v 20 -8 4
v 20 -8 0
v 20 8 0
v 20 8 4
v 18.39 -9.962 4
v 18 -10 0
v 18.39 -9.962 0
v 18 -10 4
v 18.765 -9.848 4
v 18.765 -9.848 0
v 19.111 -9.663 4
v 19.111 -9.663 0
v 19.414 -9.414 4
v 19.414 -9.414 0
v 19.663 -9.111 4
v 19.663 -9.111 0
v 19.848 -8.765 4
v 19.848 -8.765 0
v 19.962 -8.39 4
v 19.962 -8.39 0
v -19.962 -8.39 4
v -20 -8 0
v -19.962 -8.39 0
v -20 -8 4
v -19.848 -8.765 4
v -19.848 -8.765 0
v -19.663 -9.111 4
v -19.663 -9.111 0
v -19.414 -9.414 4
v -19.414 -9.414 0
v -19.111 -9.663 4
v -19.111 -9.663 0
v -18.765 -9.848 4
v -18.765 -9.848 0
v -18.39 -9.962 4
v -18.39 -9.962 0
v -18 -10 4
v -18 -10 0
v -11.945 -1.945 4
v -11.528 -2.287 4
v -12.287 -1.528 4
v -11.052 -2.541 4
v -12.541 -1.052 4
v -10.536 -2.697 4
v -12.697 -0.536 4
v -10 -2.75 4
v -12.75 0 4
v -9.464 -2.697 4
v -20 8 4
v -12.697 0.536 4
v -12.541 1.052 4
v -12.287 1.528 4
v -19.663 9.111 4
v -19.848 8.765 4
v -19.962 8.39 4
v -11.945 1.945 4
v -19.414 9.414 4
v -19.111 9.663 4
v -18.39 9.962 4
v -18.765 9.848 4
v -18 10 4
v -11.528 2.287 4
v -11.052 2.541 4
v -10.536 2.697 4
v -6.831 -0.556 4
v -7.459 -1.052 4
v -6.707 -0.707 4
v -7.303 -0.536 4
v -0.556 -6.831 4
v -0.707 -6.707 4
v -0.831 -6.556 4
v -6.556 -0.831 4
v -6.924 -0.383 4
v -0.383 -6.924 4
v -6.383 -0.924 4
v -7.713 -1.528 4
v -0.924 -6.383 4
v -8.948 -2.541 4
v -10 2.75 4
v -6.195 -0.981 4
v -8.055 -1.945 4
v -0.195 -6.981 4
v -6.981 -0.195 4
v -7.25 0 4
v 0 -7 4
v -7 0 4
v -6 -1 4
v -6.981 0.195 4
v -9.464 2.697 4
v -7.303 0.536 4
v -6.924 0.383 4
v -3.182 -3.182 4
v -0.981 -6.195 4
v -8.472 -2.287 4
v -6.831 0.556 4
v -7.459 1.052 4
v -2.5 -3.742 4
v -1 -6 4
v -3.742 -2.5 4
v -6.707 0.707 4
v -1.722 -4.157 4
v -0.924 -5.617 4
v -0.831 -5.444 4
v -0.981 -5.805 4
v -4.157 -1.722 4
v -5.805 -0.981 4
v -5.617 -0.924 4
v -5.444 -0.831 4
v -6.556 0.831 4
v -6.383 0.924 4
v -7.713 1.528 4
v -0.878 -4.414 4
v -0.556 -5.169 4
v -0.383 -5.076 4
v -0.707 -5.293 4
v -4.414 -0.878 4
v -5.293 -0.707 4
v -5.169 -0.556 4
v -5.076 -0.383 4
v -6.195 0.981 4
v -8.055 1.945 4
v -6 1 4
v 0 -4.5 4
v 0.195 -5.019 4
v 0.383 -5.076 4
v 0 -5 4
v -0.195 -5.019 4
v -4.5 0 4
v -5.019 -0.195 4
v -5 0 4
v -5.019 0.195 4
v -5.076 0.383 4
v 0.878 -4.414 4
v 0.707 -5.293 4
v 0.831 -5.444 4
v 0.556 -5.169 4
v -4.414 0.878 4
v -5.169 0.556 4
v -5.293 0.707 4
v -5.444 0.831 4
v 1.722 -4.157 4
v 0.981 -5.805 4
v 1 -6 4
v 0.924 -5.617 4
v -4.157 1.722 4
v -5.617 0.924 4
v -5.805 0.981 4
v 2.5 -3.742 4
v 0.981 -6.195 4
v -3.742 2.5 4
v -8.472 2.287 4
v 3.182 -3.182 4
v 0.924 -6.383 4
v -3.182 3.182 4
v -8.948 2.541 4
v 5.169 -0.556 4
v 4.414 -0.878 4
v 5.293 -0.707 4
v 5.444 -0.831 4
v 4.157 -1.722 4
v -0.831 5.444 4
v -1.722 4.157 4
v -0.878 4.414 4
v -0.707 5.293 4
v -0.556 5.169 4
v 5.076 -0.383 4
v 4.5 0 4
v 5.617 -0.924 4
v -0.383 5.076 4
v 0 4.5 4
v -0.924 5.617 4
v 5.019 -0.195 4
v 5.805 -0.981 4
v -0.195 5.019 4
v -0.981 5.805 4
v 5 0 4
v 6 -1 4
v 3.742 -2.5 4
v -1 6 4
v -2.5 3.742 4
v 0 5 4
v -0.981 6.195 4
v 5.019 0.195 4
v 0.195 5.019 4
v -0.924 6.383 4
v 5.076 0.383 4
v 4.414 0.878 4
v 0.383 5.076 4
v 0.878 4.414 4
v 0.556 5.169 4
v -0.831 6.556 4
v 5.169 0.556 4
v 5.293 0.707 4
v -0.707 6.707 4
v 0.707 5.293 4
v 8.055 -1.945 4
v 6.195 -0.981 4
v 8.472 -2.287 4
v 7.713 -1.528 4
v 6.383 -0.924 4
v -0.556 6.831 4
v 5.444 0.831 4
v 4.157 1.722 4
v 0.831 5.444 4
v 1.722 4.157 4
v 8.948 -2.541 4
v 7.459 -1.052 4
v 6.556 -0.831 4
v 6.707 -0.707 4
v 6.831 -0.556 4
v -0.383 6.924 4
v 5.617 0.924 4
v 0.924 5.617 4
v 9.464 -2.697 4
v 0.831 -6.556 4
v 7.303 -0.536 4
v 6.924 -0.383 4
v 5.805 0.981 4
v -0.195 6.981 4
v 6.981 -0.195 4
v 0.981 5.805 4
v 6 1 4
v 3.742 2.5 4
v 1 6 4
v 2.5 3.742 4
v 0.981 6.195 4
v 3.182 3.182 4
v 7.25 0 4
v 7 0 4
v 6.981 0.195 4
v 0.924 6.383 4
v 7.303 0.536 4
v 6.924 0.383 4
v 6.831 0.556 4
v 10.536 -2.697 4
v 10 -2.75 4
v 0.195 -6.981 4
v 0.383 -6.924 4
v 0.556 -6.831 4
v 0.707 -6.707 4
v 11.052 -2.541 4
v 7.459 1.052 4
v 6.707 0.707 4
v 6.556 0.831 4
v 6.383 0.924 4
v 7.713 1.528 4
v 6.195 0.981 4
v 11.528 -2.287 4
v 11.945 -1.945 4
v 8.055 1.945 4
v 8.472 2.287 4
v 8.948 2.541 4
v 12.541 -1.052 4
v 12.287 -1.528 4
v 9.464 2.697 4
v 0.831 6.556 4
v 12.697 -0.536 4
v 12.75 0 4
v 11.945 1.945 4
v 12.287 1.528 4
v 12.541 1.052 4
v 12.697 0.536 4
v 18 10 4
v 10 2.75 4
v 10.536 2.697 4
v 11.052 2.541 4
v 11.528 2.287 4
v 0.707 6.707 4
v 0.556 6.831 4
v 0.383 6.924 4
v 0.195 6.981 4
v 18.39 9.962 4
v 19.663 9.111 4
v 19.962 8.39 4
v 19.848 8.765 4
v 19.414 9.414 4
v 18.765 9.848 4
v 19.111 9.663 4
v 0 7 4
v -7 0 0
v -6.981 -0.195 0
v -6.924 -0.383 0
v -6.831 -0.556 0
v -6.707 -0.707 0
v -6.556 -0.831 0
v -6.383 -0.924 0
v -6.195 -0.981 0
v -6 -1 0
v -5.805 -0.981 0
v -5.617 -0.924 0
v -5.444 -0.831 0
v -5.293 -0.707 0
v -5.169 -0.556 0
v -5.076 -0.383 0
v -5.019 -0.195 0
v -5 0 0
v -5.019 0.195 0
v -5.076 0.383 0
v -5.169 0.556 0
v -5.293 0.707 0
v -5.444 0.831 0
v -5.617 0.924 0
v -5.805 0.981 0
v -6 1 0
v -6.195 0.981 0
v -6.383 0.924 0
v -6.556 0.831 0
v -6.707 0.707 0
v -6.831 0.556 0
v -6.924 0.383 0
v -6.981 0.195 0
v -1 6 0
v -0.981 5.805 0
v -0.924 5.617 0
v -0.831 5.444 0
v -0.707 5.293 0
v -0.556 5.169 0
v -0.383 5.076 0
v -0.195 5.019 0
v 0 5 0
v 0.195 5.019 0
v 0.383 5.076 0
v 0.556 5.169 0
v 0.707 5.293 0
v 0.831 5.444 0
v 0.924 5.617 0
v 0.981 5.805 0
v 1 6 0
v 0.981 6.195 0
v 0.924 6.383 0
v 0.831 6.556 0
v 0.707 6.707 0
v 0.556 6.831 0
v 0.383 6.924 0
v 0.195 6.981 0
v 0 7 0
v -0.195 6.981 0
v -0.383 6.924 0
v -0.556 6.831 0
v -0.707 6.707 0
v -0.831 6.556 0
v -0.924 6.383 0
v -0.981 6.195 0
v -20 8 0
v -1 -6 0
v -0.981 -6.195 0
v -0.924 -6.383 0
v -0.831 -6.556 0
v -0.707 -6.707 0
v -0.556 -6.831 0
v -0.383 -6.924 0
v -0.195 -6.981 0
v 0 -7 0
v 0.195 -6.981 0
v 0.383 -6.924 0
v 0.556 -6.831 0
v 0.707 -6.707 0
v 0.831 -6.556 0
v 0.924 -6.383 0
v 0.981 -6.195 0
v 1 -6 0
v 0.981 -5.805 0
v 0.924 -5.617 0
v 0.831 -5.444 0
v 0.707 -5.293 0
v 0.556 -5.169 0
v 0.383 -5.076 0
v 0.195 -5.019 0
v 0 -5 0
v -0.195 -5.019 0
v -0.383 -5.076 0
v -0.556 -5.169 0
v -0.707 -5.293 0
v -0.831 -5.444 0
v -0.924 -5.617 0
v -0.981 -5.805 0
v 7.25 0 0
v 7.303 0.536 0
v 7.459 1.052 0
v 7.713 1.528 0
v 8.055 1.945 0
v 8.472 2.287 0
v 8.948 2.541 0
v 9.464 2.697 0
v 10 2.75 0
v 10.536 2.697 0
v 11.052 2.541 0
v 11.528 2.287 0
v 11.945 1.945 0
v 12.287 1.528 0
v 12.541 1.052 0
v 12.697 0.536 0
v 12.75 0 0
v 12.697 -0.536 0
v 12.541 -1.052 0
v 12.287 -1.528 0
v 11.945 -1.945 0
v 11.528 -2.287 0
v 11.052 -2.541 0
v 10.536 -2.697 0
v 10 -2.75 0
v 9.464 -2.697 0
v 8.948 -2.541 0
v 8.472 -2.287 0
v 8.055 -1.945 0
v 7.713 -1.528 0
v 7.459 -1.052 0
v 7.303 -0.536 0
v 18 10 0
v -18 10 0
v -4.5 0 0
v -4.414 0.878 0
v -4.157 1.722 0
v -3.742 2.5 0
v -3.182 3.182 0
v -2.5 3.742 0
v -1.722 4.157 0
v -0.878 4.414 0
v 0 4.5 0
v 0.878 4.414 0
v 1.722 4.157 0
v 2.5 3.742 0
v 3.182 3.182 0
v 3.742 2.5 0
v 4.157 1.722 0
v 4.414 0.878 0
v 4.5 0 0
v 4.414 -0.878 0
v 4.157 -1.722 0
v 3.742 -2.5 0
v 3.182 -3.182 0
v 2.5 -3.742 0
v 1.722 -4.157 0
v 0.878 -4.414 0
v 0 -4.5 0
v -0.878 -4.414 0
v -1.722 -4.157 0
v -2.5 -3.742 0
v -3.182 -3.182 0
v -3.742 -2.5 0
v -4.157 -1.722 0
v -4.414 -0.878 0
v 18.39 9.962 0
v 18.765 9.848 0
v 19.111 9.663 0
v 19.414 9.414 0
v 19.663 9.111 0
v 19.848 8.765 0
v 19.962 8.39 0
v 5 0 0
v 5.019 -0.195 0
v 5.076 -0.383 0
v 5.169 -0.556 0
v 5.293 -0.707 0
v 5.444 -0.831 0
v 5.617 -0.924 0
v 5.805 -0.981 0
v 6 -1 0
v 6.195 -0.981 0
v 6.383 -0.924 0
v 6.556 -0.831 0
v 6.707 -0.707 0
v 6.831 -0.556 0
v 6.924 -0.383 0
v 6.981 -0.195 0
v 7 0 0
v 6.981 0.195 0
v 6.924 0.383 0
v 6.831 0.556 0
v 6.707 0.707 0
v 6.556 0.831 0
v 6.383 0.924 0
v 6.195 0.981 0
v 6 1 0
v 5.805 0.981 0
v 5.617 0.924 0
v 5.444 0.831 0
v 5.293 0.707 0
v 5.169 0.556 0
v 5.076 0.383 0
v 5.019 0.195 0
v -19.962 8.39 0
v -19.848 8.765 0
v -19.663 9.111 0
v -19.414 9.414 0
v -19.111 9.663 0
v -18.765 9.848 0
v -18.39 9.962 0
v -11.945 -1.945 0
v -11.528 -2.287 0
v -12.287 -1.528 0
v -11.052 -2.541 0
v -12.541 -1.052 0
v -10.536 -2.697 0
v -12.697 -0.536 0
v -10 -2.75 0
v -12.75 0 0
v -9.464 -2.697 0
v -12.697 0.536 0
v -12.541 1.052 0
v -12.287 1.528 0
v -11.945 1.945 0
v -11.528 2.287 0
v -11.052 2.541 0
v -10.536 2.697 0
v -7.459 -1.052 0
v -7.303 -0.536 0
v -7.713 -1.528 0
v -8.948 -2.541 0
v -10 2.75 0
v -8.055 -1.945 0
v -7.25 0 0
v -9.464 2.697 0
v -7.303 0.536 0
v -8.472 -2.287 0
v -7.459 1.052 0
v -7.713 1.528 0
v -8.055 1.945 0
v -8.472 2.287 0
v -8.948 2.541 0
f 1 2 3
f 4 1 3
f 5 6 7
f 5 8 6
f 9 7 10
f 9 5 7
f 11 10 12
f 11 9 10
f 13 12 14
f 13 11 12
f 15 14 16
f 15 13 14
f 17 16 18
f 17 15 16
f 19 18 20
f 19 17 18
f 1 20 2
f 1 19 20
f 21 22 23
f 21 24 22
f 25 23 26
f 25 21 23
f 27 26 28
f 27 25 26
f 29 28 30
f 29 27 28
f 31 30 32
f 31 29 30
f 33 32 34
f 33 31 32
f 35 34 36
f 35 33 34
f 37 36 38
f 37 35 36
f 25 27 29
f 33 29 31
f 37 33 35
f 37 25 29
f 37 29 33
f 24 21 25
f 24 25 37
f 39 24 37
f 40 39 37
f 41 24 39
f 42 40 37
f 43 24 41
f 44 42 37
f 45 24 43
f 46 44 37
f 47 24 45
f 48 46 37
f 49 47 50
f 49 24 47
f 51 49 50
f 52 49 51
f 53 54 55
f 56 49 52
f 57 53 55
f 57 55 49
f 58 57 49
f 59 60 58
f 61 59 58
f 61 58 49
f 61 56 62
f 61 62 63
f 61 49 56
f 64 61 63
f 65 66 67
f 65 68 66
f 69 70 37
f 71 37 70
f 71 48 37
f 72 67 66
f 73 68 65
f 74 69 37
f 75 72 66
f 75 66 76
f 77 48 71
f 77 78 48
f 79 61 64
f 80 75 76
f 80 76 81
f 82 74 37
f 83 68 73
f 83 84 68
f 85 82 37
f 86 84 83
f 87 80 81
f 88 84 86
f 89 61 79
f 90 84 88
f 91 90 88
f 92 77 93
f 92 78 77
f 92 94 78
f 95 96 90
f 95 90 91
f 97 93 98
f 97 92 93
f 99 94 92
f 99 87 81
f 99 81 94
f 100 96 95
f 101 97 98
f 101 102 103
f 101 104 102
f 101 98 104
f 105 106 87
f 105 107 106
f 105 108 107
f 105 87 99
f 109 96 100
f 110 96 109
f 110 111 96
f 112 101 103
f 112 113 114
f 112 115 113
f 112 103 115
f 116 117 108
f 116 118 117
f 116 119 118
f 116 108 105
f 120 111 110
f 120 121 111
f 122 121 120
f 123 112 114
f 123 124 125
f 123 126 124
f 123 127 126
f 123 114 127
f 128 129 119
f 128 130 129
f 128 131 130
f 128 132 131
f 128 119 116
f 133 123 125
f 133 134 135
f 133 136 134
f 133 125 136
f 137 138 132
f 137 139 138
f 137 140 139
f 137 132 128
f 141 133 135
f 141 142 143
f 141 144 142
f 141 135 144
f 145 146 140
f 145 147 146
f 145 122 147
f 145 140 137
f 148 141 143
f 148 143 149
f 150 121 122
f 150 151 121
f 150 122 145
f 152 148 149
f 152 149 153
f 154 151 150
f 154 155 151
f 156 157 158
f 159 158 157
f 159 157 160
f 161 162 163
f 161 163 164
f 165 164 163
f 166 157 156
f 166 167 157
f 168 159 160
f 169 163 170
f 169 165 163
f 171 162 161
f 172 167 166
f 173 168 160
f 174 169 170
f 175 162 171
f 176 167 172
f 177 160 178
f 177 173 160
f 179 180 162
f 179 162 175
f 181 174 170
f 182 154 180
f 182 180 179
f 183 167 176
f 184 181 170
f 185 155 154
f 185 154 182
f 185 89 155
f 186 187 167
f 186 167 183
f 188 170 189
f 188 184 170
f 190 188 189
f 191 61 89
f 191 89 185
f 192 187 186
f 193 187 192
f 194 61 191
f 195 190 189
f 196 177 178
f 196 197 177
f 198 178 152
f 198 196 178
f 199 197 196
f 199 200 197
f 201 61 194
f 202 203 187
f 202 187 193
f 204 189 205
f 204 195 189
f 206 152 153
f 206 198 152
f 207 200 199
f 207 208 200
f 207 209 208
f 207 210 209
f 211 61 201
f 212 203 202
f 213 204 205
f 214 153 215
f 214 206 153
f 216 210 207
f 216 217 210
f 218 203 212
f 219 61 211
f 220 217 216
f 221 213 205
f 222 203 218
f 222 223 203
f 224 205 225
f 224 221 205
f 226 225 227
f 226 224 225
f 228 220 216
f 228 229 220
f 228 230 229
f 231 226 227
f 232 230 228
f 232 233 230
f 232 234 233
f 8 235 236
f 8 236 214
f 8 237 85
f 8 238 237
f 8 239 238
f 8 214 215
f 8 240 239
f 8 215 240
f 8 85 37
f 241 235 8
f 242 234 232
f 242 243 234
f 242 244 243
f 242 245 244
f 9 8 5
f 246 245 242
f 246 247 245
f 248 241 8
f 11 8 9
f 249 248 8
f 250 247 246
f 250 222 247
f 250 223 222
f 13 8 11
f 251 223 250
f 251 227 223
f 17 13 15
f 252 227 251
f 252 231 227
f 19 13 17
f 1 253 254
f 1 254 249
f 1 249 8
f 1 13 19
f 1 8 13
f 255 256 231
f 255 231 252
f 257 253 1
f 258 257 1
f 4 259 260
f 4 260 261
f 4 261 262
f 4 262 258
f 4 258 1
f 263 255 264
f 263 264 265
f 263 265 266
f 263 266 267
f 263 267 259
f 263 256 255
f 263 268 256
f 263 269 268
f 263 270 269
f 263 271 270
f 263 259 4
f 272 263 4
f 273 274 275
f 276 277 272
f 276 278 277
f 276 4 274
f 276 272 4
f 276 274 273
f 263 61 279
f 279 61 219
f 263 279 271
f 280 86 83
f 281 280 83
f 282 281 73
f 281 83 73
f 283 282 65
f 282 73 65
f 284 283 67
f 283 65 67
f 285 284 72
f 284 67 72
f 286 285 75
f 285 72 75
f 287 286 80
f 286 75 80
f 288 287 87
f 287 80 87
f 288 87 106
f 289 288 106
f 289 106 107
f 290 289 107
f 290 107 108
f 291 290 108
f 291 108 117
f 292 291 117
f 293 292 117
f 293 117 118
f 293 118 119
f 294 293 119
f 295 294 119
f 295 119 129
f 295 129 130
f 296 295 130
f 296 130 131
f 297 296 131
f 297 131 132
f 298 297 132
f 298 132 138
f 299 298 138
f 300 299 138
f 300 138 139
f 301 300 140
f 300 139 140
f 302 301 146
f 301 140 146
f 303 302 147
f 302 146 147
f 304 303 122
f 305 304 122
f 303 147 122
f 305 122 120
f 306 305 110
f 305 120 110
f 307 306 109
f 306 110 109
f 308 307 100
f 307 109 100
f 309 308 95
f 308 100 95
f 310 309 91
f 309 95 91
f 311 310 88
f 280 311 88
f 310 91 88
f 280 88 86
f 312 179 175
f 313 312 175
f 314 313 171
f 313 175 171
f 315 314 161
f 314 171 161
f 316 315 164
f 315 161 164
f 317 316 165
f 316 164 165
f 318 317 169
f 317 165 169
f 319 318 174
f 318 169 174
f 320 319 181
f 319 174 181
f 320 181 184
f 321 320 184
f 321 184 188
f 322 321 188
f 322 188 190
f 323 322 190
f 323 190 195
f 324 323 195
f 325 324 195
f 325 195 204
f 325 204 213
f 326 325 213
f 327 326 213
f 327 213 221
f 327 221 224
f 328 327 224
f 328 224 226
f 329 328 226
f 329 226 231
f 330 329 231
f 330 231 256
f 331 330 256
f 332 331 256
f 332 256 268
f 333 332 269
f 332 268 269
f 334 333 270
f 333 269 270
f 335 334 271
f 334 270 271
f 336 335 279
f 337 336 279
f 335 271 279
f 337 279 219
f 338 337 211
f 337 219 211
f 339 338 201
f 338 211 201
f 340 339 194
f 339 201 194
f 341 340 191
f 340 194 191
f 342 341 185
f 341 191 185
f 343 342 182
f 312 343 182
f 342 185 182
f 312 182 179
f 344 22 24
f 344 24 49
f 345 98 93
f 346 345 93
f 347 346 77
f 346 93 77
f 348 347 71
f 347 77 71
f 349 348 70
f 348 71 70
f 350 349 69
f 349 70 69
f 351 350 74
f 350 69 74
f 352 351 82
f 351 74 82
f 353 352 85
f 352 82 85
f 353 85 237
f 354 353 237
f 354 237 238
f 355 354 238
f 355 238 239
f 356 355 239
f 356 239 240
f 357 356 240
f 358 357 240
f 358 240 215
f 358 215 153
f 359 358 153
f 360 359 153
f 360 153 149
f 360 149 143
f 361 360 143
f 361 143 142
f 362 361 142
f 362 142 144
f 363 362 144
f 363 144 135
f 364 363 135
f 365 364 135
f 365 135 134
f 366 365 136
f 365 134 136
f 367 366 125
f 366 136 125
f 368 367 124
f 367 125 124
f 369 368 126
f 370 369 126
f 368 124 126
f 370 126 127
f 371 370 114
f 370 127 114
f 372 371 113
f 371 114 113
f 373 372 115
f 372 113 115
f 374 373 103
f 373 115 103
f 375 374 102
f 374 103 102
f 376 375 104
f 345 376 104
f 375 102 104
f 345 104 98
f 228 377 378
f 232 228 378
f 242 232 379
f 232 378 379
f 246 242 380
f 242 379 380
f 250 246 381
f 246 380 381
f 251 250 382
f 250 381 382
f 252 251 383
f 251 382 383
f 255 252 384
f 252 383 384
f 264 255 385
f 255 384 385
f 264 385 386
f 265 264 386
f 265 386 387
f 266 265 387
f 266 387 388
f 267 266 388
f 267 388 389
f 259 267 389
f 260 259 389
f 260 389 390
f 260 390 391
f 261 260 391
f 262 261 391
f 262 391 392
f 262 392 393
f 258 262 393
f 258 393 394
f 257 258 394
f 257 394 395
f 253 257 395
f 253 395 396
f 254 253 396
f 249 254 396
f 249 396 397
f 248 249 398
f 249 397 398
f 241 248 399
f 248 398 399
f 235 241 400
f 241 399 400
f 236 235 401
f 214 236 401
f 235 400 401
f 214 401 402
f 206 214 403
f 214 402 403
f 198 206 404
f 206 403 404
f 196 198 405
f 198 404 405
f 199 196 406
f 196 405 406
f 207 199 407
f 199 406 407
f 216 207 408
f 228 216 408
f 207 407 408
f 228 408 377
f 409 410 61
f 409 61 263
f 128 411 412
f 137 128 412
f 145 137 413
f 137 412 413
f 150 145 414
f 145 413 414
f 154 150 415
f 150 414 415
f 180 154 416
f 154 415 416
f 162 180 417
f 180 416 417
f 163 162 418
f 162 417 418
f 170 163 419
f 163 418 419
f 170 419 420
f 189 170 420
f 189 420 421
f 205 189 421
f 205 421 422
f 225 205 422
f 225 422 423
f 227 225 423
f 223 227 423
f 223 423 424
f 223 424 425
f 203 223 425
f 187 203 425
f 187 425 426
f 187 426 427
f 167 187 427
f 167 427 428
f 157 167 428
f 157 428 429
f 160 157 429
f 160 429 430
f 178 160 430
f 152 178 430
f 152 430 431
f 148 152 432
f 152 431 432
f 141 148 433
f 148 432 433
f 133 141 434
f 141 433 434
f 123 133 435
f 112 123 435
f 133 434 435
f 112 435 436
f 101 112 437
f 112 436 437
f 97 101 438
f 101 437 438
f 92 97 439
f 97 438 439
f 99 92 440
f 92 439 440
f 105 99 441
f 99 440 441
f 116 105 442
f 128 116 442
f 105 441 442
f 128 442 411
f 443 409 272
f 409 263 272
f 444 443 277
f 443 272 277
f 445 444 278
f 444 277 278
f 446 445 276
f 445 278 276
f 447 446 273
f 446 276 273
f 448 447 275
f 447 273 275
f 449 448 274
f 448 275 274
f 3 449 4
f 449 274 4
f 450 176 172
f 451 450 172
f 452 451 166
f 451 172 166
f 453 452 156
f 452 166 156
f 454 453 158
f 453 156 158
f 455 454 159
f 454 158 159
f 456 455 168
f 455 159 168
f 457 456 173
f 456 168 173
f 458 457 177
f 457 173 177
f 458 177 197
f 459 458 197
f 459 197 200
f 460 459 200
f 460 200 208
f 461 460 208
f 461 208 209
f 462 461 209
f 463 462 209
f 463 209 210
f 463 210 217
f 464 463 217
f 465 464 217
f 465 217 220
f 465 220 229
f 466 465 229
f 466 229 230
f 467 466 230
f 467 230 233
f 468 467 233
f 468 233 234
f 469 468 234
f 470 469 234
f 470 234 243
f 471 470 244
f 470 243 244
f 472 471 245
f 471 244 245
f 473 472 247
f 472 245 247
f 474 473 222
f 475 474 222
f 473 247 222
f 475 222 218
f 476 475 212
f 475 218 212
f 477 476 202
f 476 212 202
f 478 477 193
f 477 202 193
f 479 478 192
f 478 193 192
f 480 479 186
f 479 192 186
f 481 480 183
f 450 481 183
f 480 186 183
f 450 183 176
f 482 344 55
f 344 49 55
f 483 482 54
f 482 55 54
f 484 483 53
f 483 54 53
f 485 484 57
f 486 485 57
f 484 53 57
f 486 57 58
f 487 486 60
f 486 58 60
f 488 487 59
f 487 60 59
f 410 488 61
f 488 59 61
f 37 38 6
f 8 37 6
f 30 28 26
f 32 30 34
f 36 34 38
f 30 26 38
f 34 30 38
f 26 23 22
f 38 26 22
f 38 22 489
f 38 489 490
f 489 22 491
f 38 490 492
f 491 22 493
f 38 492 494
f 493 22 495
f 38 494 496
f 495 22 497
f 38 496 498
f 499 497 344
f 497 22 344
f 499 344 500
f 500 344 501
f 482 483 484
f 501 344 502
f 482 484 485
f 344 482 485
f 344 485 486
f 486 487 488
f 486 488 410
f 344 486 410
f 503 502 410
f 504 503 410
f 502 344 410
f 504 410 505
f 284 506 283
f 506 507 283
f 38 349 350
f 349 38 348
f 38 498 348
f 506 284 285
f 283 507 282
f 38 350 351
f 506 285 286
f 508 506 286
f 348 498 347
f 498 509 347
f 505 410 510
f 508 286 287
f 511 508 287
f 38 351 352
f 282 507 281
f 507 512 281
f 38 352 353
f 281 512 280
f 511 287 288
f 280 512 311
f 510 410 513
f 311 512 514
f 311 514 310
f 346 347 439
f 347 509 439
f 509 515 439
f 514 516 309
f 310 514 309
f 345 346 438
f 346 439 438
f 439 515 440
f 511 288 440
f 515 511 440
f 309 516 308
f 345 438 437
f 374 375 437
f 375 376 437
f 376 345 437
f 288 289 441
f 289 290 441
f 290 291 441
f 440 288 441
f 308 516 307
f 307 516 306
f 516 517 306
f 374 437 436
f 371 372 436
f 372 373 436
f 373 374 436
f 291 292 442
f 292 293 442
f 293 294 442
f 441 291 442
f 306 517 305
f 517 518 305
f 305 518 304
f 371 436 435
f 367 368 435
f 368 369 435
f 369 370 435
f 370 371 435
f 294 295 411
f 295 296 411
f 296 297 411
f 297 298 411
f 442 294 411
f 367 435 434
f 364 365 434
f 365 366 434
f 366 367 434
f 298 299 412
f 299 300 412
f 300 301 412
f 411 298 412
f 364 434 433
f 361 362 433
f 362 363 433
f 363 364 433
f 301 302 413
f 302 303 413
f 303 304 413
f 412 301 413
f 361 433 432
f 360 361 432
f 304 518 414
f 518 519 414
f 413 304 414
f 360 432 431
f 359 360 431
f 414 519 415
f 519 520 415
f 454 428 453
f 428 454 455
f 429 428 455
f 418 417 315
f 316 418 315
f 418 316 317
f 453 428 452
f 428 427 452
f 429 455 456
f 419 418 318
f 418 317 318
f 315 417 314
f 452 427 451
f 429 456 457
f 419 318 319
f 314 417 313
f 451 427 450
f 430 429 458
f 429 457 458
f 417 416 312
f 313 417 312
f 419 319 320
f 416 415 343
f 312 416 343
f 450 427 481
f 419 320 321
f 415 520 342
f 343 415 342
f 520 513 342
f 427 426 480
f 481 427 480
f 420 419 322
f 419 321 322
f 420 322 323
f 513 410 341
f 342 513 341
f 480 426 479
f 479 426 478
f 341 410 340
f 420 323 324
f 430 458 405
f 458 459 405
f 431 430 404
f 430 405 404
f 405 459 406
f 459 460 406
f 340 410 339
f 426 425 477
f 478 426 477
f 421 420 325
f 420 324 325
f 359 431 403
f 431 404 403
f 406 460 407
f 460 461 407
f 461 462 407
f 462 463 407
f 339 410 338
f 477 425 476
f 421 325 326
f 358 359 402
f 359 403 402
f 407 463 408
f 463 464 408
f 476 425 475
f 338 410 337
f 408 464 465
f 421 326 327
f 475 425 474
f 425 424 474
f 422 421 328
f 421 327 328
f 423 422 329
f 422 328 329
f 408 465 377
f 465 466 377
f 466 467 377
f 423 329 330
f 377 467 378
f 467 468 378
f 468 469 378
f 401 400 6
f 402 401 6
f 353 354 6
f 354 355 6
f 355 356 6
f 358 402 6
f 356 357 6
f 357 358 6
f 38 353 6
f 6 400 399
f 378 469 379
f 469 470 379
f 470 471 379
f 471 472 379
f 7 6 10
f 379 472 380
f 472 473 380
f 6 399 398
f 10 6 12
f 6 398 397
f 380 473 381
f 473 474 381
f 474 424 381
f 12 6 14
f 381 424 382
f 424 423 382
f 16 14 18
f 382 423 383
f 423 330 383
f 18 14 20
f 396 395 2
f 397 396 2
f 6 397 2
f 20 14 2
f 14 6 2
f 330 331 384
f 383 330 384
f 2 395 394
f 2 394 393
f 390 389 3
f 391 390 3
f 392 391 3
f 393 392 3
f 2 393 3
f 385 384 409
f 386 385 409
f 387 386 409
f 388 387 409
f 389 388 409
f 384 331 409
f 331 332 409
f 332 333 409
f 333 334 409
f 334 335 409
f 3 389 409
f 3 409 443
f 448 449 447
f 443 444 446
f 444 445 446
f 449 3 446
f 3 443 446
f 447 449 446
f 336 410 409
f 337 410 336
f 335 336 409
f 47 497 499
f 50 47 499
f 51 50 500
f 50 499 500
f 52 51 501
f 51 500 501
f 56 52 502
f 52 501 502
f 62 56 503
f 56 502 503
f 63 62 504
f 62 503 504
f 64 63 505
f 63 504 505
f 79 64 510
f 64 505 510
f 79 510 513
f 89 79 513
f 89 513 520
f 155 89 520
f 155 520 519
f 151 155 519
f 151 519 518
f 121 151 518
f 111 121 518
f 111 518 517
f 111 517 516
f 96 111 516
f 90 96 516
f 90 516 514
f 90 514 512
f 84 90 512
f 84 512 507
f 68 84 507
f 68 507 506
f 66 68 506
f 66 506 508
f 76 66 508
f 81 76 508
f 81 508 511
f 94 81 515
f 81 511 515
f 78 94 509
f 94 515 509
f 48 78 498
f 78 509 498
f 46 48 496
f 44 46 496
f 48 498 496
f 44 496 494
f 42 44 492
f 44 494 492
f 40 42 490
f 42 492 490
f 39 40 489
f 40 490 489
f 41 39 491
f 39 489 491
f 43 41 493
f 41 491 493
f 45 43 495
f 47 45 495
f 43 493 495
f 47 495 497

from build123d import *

# Parameters (mm, degrees)
F6_W     = 40
F6_H     = 20
F6_R     = 6
F7_DEPTH = 4
F0_D     = 2
F1_D     = 9
F2_R     = 2
F4_D     = 5.5


with BuildPart() as f7:
    # F6 (on Top) → F7 (new body)
    with BuildSketch(Plane.XY):
        Rectangle(F6_W, F6_H)
        Circle(F6_R, mode=Mode.SUBTRACT)
        Circle(F6_R)
    extrude(amount=F7_DEPTH)

    # F0 (through all)
    with Locations(Plane(origin=(0, 0, 0), x_dir=(1, 0, 0), z_dir=(0, 0, -1))):
        with Locations((0, -6), (-6, 0), (6, 0), (0, 6)):
            Hole(F0_D / 2)

    # F1 (through all)
    with Locations(Plane.XY.offset(4)):
        with Locations((0, 0)):
            Hole(F1_D / 2)

    # F2
    f2_edges = [f7.edges().sort_by_distance(p)[0] for p in [
        (20, 10, 2),
        (20, -10, 2),
        (-20, -10, 2),
        (-20, 10, 2),
    ]]
    fillet(f2_edges, radius=F2_R)

    # F4 (through all)
    with Locations(Plane.XY.offset(4)):
        with Locations((10, 0), (-10, 0)):
            Hole(F4_D / 2)


solid = f7.part
